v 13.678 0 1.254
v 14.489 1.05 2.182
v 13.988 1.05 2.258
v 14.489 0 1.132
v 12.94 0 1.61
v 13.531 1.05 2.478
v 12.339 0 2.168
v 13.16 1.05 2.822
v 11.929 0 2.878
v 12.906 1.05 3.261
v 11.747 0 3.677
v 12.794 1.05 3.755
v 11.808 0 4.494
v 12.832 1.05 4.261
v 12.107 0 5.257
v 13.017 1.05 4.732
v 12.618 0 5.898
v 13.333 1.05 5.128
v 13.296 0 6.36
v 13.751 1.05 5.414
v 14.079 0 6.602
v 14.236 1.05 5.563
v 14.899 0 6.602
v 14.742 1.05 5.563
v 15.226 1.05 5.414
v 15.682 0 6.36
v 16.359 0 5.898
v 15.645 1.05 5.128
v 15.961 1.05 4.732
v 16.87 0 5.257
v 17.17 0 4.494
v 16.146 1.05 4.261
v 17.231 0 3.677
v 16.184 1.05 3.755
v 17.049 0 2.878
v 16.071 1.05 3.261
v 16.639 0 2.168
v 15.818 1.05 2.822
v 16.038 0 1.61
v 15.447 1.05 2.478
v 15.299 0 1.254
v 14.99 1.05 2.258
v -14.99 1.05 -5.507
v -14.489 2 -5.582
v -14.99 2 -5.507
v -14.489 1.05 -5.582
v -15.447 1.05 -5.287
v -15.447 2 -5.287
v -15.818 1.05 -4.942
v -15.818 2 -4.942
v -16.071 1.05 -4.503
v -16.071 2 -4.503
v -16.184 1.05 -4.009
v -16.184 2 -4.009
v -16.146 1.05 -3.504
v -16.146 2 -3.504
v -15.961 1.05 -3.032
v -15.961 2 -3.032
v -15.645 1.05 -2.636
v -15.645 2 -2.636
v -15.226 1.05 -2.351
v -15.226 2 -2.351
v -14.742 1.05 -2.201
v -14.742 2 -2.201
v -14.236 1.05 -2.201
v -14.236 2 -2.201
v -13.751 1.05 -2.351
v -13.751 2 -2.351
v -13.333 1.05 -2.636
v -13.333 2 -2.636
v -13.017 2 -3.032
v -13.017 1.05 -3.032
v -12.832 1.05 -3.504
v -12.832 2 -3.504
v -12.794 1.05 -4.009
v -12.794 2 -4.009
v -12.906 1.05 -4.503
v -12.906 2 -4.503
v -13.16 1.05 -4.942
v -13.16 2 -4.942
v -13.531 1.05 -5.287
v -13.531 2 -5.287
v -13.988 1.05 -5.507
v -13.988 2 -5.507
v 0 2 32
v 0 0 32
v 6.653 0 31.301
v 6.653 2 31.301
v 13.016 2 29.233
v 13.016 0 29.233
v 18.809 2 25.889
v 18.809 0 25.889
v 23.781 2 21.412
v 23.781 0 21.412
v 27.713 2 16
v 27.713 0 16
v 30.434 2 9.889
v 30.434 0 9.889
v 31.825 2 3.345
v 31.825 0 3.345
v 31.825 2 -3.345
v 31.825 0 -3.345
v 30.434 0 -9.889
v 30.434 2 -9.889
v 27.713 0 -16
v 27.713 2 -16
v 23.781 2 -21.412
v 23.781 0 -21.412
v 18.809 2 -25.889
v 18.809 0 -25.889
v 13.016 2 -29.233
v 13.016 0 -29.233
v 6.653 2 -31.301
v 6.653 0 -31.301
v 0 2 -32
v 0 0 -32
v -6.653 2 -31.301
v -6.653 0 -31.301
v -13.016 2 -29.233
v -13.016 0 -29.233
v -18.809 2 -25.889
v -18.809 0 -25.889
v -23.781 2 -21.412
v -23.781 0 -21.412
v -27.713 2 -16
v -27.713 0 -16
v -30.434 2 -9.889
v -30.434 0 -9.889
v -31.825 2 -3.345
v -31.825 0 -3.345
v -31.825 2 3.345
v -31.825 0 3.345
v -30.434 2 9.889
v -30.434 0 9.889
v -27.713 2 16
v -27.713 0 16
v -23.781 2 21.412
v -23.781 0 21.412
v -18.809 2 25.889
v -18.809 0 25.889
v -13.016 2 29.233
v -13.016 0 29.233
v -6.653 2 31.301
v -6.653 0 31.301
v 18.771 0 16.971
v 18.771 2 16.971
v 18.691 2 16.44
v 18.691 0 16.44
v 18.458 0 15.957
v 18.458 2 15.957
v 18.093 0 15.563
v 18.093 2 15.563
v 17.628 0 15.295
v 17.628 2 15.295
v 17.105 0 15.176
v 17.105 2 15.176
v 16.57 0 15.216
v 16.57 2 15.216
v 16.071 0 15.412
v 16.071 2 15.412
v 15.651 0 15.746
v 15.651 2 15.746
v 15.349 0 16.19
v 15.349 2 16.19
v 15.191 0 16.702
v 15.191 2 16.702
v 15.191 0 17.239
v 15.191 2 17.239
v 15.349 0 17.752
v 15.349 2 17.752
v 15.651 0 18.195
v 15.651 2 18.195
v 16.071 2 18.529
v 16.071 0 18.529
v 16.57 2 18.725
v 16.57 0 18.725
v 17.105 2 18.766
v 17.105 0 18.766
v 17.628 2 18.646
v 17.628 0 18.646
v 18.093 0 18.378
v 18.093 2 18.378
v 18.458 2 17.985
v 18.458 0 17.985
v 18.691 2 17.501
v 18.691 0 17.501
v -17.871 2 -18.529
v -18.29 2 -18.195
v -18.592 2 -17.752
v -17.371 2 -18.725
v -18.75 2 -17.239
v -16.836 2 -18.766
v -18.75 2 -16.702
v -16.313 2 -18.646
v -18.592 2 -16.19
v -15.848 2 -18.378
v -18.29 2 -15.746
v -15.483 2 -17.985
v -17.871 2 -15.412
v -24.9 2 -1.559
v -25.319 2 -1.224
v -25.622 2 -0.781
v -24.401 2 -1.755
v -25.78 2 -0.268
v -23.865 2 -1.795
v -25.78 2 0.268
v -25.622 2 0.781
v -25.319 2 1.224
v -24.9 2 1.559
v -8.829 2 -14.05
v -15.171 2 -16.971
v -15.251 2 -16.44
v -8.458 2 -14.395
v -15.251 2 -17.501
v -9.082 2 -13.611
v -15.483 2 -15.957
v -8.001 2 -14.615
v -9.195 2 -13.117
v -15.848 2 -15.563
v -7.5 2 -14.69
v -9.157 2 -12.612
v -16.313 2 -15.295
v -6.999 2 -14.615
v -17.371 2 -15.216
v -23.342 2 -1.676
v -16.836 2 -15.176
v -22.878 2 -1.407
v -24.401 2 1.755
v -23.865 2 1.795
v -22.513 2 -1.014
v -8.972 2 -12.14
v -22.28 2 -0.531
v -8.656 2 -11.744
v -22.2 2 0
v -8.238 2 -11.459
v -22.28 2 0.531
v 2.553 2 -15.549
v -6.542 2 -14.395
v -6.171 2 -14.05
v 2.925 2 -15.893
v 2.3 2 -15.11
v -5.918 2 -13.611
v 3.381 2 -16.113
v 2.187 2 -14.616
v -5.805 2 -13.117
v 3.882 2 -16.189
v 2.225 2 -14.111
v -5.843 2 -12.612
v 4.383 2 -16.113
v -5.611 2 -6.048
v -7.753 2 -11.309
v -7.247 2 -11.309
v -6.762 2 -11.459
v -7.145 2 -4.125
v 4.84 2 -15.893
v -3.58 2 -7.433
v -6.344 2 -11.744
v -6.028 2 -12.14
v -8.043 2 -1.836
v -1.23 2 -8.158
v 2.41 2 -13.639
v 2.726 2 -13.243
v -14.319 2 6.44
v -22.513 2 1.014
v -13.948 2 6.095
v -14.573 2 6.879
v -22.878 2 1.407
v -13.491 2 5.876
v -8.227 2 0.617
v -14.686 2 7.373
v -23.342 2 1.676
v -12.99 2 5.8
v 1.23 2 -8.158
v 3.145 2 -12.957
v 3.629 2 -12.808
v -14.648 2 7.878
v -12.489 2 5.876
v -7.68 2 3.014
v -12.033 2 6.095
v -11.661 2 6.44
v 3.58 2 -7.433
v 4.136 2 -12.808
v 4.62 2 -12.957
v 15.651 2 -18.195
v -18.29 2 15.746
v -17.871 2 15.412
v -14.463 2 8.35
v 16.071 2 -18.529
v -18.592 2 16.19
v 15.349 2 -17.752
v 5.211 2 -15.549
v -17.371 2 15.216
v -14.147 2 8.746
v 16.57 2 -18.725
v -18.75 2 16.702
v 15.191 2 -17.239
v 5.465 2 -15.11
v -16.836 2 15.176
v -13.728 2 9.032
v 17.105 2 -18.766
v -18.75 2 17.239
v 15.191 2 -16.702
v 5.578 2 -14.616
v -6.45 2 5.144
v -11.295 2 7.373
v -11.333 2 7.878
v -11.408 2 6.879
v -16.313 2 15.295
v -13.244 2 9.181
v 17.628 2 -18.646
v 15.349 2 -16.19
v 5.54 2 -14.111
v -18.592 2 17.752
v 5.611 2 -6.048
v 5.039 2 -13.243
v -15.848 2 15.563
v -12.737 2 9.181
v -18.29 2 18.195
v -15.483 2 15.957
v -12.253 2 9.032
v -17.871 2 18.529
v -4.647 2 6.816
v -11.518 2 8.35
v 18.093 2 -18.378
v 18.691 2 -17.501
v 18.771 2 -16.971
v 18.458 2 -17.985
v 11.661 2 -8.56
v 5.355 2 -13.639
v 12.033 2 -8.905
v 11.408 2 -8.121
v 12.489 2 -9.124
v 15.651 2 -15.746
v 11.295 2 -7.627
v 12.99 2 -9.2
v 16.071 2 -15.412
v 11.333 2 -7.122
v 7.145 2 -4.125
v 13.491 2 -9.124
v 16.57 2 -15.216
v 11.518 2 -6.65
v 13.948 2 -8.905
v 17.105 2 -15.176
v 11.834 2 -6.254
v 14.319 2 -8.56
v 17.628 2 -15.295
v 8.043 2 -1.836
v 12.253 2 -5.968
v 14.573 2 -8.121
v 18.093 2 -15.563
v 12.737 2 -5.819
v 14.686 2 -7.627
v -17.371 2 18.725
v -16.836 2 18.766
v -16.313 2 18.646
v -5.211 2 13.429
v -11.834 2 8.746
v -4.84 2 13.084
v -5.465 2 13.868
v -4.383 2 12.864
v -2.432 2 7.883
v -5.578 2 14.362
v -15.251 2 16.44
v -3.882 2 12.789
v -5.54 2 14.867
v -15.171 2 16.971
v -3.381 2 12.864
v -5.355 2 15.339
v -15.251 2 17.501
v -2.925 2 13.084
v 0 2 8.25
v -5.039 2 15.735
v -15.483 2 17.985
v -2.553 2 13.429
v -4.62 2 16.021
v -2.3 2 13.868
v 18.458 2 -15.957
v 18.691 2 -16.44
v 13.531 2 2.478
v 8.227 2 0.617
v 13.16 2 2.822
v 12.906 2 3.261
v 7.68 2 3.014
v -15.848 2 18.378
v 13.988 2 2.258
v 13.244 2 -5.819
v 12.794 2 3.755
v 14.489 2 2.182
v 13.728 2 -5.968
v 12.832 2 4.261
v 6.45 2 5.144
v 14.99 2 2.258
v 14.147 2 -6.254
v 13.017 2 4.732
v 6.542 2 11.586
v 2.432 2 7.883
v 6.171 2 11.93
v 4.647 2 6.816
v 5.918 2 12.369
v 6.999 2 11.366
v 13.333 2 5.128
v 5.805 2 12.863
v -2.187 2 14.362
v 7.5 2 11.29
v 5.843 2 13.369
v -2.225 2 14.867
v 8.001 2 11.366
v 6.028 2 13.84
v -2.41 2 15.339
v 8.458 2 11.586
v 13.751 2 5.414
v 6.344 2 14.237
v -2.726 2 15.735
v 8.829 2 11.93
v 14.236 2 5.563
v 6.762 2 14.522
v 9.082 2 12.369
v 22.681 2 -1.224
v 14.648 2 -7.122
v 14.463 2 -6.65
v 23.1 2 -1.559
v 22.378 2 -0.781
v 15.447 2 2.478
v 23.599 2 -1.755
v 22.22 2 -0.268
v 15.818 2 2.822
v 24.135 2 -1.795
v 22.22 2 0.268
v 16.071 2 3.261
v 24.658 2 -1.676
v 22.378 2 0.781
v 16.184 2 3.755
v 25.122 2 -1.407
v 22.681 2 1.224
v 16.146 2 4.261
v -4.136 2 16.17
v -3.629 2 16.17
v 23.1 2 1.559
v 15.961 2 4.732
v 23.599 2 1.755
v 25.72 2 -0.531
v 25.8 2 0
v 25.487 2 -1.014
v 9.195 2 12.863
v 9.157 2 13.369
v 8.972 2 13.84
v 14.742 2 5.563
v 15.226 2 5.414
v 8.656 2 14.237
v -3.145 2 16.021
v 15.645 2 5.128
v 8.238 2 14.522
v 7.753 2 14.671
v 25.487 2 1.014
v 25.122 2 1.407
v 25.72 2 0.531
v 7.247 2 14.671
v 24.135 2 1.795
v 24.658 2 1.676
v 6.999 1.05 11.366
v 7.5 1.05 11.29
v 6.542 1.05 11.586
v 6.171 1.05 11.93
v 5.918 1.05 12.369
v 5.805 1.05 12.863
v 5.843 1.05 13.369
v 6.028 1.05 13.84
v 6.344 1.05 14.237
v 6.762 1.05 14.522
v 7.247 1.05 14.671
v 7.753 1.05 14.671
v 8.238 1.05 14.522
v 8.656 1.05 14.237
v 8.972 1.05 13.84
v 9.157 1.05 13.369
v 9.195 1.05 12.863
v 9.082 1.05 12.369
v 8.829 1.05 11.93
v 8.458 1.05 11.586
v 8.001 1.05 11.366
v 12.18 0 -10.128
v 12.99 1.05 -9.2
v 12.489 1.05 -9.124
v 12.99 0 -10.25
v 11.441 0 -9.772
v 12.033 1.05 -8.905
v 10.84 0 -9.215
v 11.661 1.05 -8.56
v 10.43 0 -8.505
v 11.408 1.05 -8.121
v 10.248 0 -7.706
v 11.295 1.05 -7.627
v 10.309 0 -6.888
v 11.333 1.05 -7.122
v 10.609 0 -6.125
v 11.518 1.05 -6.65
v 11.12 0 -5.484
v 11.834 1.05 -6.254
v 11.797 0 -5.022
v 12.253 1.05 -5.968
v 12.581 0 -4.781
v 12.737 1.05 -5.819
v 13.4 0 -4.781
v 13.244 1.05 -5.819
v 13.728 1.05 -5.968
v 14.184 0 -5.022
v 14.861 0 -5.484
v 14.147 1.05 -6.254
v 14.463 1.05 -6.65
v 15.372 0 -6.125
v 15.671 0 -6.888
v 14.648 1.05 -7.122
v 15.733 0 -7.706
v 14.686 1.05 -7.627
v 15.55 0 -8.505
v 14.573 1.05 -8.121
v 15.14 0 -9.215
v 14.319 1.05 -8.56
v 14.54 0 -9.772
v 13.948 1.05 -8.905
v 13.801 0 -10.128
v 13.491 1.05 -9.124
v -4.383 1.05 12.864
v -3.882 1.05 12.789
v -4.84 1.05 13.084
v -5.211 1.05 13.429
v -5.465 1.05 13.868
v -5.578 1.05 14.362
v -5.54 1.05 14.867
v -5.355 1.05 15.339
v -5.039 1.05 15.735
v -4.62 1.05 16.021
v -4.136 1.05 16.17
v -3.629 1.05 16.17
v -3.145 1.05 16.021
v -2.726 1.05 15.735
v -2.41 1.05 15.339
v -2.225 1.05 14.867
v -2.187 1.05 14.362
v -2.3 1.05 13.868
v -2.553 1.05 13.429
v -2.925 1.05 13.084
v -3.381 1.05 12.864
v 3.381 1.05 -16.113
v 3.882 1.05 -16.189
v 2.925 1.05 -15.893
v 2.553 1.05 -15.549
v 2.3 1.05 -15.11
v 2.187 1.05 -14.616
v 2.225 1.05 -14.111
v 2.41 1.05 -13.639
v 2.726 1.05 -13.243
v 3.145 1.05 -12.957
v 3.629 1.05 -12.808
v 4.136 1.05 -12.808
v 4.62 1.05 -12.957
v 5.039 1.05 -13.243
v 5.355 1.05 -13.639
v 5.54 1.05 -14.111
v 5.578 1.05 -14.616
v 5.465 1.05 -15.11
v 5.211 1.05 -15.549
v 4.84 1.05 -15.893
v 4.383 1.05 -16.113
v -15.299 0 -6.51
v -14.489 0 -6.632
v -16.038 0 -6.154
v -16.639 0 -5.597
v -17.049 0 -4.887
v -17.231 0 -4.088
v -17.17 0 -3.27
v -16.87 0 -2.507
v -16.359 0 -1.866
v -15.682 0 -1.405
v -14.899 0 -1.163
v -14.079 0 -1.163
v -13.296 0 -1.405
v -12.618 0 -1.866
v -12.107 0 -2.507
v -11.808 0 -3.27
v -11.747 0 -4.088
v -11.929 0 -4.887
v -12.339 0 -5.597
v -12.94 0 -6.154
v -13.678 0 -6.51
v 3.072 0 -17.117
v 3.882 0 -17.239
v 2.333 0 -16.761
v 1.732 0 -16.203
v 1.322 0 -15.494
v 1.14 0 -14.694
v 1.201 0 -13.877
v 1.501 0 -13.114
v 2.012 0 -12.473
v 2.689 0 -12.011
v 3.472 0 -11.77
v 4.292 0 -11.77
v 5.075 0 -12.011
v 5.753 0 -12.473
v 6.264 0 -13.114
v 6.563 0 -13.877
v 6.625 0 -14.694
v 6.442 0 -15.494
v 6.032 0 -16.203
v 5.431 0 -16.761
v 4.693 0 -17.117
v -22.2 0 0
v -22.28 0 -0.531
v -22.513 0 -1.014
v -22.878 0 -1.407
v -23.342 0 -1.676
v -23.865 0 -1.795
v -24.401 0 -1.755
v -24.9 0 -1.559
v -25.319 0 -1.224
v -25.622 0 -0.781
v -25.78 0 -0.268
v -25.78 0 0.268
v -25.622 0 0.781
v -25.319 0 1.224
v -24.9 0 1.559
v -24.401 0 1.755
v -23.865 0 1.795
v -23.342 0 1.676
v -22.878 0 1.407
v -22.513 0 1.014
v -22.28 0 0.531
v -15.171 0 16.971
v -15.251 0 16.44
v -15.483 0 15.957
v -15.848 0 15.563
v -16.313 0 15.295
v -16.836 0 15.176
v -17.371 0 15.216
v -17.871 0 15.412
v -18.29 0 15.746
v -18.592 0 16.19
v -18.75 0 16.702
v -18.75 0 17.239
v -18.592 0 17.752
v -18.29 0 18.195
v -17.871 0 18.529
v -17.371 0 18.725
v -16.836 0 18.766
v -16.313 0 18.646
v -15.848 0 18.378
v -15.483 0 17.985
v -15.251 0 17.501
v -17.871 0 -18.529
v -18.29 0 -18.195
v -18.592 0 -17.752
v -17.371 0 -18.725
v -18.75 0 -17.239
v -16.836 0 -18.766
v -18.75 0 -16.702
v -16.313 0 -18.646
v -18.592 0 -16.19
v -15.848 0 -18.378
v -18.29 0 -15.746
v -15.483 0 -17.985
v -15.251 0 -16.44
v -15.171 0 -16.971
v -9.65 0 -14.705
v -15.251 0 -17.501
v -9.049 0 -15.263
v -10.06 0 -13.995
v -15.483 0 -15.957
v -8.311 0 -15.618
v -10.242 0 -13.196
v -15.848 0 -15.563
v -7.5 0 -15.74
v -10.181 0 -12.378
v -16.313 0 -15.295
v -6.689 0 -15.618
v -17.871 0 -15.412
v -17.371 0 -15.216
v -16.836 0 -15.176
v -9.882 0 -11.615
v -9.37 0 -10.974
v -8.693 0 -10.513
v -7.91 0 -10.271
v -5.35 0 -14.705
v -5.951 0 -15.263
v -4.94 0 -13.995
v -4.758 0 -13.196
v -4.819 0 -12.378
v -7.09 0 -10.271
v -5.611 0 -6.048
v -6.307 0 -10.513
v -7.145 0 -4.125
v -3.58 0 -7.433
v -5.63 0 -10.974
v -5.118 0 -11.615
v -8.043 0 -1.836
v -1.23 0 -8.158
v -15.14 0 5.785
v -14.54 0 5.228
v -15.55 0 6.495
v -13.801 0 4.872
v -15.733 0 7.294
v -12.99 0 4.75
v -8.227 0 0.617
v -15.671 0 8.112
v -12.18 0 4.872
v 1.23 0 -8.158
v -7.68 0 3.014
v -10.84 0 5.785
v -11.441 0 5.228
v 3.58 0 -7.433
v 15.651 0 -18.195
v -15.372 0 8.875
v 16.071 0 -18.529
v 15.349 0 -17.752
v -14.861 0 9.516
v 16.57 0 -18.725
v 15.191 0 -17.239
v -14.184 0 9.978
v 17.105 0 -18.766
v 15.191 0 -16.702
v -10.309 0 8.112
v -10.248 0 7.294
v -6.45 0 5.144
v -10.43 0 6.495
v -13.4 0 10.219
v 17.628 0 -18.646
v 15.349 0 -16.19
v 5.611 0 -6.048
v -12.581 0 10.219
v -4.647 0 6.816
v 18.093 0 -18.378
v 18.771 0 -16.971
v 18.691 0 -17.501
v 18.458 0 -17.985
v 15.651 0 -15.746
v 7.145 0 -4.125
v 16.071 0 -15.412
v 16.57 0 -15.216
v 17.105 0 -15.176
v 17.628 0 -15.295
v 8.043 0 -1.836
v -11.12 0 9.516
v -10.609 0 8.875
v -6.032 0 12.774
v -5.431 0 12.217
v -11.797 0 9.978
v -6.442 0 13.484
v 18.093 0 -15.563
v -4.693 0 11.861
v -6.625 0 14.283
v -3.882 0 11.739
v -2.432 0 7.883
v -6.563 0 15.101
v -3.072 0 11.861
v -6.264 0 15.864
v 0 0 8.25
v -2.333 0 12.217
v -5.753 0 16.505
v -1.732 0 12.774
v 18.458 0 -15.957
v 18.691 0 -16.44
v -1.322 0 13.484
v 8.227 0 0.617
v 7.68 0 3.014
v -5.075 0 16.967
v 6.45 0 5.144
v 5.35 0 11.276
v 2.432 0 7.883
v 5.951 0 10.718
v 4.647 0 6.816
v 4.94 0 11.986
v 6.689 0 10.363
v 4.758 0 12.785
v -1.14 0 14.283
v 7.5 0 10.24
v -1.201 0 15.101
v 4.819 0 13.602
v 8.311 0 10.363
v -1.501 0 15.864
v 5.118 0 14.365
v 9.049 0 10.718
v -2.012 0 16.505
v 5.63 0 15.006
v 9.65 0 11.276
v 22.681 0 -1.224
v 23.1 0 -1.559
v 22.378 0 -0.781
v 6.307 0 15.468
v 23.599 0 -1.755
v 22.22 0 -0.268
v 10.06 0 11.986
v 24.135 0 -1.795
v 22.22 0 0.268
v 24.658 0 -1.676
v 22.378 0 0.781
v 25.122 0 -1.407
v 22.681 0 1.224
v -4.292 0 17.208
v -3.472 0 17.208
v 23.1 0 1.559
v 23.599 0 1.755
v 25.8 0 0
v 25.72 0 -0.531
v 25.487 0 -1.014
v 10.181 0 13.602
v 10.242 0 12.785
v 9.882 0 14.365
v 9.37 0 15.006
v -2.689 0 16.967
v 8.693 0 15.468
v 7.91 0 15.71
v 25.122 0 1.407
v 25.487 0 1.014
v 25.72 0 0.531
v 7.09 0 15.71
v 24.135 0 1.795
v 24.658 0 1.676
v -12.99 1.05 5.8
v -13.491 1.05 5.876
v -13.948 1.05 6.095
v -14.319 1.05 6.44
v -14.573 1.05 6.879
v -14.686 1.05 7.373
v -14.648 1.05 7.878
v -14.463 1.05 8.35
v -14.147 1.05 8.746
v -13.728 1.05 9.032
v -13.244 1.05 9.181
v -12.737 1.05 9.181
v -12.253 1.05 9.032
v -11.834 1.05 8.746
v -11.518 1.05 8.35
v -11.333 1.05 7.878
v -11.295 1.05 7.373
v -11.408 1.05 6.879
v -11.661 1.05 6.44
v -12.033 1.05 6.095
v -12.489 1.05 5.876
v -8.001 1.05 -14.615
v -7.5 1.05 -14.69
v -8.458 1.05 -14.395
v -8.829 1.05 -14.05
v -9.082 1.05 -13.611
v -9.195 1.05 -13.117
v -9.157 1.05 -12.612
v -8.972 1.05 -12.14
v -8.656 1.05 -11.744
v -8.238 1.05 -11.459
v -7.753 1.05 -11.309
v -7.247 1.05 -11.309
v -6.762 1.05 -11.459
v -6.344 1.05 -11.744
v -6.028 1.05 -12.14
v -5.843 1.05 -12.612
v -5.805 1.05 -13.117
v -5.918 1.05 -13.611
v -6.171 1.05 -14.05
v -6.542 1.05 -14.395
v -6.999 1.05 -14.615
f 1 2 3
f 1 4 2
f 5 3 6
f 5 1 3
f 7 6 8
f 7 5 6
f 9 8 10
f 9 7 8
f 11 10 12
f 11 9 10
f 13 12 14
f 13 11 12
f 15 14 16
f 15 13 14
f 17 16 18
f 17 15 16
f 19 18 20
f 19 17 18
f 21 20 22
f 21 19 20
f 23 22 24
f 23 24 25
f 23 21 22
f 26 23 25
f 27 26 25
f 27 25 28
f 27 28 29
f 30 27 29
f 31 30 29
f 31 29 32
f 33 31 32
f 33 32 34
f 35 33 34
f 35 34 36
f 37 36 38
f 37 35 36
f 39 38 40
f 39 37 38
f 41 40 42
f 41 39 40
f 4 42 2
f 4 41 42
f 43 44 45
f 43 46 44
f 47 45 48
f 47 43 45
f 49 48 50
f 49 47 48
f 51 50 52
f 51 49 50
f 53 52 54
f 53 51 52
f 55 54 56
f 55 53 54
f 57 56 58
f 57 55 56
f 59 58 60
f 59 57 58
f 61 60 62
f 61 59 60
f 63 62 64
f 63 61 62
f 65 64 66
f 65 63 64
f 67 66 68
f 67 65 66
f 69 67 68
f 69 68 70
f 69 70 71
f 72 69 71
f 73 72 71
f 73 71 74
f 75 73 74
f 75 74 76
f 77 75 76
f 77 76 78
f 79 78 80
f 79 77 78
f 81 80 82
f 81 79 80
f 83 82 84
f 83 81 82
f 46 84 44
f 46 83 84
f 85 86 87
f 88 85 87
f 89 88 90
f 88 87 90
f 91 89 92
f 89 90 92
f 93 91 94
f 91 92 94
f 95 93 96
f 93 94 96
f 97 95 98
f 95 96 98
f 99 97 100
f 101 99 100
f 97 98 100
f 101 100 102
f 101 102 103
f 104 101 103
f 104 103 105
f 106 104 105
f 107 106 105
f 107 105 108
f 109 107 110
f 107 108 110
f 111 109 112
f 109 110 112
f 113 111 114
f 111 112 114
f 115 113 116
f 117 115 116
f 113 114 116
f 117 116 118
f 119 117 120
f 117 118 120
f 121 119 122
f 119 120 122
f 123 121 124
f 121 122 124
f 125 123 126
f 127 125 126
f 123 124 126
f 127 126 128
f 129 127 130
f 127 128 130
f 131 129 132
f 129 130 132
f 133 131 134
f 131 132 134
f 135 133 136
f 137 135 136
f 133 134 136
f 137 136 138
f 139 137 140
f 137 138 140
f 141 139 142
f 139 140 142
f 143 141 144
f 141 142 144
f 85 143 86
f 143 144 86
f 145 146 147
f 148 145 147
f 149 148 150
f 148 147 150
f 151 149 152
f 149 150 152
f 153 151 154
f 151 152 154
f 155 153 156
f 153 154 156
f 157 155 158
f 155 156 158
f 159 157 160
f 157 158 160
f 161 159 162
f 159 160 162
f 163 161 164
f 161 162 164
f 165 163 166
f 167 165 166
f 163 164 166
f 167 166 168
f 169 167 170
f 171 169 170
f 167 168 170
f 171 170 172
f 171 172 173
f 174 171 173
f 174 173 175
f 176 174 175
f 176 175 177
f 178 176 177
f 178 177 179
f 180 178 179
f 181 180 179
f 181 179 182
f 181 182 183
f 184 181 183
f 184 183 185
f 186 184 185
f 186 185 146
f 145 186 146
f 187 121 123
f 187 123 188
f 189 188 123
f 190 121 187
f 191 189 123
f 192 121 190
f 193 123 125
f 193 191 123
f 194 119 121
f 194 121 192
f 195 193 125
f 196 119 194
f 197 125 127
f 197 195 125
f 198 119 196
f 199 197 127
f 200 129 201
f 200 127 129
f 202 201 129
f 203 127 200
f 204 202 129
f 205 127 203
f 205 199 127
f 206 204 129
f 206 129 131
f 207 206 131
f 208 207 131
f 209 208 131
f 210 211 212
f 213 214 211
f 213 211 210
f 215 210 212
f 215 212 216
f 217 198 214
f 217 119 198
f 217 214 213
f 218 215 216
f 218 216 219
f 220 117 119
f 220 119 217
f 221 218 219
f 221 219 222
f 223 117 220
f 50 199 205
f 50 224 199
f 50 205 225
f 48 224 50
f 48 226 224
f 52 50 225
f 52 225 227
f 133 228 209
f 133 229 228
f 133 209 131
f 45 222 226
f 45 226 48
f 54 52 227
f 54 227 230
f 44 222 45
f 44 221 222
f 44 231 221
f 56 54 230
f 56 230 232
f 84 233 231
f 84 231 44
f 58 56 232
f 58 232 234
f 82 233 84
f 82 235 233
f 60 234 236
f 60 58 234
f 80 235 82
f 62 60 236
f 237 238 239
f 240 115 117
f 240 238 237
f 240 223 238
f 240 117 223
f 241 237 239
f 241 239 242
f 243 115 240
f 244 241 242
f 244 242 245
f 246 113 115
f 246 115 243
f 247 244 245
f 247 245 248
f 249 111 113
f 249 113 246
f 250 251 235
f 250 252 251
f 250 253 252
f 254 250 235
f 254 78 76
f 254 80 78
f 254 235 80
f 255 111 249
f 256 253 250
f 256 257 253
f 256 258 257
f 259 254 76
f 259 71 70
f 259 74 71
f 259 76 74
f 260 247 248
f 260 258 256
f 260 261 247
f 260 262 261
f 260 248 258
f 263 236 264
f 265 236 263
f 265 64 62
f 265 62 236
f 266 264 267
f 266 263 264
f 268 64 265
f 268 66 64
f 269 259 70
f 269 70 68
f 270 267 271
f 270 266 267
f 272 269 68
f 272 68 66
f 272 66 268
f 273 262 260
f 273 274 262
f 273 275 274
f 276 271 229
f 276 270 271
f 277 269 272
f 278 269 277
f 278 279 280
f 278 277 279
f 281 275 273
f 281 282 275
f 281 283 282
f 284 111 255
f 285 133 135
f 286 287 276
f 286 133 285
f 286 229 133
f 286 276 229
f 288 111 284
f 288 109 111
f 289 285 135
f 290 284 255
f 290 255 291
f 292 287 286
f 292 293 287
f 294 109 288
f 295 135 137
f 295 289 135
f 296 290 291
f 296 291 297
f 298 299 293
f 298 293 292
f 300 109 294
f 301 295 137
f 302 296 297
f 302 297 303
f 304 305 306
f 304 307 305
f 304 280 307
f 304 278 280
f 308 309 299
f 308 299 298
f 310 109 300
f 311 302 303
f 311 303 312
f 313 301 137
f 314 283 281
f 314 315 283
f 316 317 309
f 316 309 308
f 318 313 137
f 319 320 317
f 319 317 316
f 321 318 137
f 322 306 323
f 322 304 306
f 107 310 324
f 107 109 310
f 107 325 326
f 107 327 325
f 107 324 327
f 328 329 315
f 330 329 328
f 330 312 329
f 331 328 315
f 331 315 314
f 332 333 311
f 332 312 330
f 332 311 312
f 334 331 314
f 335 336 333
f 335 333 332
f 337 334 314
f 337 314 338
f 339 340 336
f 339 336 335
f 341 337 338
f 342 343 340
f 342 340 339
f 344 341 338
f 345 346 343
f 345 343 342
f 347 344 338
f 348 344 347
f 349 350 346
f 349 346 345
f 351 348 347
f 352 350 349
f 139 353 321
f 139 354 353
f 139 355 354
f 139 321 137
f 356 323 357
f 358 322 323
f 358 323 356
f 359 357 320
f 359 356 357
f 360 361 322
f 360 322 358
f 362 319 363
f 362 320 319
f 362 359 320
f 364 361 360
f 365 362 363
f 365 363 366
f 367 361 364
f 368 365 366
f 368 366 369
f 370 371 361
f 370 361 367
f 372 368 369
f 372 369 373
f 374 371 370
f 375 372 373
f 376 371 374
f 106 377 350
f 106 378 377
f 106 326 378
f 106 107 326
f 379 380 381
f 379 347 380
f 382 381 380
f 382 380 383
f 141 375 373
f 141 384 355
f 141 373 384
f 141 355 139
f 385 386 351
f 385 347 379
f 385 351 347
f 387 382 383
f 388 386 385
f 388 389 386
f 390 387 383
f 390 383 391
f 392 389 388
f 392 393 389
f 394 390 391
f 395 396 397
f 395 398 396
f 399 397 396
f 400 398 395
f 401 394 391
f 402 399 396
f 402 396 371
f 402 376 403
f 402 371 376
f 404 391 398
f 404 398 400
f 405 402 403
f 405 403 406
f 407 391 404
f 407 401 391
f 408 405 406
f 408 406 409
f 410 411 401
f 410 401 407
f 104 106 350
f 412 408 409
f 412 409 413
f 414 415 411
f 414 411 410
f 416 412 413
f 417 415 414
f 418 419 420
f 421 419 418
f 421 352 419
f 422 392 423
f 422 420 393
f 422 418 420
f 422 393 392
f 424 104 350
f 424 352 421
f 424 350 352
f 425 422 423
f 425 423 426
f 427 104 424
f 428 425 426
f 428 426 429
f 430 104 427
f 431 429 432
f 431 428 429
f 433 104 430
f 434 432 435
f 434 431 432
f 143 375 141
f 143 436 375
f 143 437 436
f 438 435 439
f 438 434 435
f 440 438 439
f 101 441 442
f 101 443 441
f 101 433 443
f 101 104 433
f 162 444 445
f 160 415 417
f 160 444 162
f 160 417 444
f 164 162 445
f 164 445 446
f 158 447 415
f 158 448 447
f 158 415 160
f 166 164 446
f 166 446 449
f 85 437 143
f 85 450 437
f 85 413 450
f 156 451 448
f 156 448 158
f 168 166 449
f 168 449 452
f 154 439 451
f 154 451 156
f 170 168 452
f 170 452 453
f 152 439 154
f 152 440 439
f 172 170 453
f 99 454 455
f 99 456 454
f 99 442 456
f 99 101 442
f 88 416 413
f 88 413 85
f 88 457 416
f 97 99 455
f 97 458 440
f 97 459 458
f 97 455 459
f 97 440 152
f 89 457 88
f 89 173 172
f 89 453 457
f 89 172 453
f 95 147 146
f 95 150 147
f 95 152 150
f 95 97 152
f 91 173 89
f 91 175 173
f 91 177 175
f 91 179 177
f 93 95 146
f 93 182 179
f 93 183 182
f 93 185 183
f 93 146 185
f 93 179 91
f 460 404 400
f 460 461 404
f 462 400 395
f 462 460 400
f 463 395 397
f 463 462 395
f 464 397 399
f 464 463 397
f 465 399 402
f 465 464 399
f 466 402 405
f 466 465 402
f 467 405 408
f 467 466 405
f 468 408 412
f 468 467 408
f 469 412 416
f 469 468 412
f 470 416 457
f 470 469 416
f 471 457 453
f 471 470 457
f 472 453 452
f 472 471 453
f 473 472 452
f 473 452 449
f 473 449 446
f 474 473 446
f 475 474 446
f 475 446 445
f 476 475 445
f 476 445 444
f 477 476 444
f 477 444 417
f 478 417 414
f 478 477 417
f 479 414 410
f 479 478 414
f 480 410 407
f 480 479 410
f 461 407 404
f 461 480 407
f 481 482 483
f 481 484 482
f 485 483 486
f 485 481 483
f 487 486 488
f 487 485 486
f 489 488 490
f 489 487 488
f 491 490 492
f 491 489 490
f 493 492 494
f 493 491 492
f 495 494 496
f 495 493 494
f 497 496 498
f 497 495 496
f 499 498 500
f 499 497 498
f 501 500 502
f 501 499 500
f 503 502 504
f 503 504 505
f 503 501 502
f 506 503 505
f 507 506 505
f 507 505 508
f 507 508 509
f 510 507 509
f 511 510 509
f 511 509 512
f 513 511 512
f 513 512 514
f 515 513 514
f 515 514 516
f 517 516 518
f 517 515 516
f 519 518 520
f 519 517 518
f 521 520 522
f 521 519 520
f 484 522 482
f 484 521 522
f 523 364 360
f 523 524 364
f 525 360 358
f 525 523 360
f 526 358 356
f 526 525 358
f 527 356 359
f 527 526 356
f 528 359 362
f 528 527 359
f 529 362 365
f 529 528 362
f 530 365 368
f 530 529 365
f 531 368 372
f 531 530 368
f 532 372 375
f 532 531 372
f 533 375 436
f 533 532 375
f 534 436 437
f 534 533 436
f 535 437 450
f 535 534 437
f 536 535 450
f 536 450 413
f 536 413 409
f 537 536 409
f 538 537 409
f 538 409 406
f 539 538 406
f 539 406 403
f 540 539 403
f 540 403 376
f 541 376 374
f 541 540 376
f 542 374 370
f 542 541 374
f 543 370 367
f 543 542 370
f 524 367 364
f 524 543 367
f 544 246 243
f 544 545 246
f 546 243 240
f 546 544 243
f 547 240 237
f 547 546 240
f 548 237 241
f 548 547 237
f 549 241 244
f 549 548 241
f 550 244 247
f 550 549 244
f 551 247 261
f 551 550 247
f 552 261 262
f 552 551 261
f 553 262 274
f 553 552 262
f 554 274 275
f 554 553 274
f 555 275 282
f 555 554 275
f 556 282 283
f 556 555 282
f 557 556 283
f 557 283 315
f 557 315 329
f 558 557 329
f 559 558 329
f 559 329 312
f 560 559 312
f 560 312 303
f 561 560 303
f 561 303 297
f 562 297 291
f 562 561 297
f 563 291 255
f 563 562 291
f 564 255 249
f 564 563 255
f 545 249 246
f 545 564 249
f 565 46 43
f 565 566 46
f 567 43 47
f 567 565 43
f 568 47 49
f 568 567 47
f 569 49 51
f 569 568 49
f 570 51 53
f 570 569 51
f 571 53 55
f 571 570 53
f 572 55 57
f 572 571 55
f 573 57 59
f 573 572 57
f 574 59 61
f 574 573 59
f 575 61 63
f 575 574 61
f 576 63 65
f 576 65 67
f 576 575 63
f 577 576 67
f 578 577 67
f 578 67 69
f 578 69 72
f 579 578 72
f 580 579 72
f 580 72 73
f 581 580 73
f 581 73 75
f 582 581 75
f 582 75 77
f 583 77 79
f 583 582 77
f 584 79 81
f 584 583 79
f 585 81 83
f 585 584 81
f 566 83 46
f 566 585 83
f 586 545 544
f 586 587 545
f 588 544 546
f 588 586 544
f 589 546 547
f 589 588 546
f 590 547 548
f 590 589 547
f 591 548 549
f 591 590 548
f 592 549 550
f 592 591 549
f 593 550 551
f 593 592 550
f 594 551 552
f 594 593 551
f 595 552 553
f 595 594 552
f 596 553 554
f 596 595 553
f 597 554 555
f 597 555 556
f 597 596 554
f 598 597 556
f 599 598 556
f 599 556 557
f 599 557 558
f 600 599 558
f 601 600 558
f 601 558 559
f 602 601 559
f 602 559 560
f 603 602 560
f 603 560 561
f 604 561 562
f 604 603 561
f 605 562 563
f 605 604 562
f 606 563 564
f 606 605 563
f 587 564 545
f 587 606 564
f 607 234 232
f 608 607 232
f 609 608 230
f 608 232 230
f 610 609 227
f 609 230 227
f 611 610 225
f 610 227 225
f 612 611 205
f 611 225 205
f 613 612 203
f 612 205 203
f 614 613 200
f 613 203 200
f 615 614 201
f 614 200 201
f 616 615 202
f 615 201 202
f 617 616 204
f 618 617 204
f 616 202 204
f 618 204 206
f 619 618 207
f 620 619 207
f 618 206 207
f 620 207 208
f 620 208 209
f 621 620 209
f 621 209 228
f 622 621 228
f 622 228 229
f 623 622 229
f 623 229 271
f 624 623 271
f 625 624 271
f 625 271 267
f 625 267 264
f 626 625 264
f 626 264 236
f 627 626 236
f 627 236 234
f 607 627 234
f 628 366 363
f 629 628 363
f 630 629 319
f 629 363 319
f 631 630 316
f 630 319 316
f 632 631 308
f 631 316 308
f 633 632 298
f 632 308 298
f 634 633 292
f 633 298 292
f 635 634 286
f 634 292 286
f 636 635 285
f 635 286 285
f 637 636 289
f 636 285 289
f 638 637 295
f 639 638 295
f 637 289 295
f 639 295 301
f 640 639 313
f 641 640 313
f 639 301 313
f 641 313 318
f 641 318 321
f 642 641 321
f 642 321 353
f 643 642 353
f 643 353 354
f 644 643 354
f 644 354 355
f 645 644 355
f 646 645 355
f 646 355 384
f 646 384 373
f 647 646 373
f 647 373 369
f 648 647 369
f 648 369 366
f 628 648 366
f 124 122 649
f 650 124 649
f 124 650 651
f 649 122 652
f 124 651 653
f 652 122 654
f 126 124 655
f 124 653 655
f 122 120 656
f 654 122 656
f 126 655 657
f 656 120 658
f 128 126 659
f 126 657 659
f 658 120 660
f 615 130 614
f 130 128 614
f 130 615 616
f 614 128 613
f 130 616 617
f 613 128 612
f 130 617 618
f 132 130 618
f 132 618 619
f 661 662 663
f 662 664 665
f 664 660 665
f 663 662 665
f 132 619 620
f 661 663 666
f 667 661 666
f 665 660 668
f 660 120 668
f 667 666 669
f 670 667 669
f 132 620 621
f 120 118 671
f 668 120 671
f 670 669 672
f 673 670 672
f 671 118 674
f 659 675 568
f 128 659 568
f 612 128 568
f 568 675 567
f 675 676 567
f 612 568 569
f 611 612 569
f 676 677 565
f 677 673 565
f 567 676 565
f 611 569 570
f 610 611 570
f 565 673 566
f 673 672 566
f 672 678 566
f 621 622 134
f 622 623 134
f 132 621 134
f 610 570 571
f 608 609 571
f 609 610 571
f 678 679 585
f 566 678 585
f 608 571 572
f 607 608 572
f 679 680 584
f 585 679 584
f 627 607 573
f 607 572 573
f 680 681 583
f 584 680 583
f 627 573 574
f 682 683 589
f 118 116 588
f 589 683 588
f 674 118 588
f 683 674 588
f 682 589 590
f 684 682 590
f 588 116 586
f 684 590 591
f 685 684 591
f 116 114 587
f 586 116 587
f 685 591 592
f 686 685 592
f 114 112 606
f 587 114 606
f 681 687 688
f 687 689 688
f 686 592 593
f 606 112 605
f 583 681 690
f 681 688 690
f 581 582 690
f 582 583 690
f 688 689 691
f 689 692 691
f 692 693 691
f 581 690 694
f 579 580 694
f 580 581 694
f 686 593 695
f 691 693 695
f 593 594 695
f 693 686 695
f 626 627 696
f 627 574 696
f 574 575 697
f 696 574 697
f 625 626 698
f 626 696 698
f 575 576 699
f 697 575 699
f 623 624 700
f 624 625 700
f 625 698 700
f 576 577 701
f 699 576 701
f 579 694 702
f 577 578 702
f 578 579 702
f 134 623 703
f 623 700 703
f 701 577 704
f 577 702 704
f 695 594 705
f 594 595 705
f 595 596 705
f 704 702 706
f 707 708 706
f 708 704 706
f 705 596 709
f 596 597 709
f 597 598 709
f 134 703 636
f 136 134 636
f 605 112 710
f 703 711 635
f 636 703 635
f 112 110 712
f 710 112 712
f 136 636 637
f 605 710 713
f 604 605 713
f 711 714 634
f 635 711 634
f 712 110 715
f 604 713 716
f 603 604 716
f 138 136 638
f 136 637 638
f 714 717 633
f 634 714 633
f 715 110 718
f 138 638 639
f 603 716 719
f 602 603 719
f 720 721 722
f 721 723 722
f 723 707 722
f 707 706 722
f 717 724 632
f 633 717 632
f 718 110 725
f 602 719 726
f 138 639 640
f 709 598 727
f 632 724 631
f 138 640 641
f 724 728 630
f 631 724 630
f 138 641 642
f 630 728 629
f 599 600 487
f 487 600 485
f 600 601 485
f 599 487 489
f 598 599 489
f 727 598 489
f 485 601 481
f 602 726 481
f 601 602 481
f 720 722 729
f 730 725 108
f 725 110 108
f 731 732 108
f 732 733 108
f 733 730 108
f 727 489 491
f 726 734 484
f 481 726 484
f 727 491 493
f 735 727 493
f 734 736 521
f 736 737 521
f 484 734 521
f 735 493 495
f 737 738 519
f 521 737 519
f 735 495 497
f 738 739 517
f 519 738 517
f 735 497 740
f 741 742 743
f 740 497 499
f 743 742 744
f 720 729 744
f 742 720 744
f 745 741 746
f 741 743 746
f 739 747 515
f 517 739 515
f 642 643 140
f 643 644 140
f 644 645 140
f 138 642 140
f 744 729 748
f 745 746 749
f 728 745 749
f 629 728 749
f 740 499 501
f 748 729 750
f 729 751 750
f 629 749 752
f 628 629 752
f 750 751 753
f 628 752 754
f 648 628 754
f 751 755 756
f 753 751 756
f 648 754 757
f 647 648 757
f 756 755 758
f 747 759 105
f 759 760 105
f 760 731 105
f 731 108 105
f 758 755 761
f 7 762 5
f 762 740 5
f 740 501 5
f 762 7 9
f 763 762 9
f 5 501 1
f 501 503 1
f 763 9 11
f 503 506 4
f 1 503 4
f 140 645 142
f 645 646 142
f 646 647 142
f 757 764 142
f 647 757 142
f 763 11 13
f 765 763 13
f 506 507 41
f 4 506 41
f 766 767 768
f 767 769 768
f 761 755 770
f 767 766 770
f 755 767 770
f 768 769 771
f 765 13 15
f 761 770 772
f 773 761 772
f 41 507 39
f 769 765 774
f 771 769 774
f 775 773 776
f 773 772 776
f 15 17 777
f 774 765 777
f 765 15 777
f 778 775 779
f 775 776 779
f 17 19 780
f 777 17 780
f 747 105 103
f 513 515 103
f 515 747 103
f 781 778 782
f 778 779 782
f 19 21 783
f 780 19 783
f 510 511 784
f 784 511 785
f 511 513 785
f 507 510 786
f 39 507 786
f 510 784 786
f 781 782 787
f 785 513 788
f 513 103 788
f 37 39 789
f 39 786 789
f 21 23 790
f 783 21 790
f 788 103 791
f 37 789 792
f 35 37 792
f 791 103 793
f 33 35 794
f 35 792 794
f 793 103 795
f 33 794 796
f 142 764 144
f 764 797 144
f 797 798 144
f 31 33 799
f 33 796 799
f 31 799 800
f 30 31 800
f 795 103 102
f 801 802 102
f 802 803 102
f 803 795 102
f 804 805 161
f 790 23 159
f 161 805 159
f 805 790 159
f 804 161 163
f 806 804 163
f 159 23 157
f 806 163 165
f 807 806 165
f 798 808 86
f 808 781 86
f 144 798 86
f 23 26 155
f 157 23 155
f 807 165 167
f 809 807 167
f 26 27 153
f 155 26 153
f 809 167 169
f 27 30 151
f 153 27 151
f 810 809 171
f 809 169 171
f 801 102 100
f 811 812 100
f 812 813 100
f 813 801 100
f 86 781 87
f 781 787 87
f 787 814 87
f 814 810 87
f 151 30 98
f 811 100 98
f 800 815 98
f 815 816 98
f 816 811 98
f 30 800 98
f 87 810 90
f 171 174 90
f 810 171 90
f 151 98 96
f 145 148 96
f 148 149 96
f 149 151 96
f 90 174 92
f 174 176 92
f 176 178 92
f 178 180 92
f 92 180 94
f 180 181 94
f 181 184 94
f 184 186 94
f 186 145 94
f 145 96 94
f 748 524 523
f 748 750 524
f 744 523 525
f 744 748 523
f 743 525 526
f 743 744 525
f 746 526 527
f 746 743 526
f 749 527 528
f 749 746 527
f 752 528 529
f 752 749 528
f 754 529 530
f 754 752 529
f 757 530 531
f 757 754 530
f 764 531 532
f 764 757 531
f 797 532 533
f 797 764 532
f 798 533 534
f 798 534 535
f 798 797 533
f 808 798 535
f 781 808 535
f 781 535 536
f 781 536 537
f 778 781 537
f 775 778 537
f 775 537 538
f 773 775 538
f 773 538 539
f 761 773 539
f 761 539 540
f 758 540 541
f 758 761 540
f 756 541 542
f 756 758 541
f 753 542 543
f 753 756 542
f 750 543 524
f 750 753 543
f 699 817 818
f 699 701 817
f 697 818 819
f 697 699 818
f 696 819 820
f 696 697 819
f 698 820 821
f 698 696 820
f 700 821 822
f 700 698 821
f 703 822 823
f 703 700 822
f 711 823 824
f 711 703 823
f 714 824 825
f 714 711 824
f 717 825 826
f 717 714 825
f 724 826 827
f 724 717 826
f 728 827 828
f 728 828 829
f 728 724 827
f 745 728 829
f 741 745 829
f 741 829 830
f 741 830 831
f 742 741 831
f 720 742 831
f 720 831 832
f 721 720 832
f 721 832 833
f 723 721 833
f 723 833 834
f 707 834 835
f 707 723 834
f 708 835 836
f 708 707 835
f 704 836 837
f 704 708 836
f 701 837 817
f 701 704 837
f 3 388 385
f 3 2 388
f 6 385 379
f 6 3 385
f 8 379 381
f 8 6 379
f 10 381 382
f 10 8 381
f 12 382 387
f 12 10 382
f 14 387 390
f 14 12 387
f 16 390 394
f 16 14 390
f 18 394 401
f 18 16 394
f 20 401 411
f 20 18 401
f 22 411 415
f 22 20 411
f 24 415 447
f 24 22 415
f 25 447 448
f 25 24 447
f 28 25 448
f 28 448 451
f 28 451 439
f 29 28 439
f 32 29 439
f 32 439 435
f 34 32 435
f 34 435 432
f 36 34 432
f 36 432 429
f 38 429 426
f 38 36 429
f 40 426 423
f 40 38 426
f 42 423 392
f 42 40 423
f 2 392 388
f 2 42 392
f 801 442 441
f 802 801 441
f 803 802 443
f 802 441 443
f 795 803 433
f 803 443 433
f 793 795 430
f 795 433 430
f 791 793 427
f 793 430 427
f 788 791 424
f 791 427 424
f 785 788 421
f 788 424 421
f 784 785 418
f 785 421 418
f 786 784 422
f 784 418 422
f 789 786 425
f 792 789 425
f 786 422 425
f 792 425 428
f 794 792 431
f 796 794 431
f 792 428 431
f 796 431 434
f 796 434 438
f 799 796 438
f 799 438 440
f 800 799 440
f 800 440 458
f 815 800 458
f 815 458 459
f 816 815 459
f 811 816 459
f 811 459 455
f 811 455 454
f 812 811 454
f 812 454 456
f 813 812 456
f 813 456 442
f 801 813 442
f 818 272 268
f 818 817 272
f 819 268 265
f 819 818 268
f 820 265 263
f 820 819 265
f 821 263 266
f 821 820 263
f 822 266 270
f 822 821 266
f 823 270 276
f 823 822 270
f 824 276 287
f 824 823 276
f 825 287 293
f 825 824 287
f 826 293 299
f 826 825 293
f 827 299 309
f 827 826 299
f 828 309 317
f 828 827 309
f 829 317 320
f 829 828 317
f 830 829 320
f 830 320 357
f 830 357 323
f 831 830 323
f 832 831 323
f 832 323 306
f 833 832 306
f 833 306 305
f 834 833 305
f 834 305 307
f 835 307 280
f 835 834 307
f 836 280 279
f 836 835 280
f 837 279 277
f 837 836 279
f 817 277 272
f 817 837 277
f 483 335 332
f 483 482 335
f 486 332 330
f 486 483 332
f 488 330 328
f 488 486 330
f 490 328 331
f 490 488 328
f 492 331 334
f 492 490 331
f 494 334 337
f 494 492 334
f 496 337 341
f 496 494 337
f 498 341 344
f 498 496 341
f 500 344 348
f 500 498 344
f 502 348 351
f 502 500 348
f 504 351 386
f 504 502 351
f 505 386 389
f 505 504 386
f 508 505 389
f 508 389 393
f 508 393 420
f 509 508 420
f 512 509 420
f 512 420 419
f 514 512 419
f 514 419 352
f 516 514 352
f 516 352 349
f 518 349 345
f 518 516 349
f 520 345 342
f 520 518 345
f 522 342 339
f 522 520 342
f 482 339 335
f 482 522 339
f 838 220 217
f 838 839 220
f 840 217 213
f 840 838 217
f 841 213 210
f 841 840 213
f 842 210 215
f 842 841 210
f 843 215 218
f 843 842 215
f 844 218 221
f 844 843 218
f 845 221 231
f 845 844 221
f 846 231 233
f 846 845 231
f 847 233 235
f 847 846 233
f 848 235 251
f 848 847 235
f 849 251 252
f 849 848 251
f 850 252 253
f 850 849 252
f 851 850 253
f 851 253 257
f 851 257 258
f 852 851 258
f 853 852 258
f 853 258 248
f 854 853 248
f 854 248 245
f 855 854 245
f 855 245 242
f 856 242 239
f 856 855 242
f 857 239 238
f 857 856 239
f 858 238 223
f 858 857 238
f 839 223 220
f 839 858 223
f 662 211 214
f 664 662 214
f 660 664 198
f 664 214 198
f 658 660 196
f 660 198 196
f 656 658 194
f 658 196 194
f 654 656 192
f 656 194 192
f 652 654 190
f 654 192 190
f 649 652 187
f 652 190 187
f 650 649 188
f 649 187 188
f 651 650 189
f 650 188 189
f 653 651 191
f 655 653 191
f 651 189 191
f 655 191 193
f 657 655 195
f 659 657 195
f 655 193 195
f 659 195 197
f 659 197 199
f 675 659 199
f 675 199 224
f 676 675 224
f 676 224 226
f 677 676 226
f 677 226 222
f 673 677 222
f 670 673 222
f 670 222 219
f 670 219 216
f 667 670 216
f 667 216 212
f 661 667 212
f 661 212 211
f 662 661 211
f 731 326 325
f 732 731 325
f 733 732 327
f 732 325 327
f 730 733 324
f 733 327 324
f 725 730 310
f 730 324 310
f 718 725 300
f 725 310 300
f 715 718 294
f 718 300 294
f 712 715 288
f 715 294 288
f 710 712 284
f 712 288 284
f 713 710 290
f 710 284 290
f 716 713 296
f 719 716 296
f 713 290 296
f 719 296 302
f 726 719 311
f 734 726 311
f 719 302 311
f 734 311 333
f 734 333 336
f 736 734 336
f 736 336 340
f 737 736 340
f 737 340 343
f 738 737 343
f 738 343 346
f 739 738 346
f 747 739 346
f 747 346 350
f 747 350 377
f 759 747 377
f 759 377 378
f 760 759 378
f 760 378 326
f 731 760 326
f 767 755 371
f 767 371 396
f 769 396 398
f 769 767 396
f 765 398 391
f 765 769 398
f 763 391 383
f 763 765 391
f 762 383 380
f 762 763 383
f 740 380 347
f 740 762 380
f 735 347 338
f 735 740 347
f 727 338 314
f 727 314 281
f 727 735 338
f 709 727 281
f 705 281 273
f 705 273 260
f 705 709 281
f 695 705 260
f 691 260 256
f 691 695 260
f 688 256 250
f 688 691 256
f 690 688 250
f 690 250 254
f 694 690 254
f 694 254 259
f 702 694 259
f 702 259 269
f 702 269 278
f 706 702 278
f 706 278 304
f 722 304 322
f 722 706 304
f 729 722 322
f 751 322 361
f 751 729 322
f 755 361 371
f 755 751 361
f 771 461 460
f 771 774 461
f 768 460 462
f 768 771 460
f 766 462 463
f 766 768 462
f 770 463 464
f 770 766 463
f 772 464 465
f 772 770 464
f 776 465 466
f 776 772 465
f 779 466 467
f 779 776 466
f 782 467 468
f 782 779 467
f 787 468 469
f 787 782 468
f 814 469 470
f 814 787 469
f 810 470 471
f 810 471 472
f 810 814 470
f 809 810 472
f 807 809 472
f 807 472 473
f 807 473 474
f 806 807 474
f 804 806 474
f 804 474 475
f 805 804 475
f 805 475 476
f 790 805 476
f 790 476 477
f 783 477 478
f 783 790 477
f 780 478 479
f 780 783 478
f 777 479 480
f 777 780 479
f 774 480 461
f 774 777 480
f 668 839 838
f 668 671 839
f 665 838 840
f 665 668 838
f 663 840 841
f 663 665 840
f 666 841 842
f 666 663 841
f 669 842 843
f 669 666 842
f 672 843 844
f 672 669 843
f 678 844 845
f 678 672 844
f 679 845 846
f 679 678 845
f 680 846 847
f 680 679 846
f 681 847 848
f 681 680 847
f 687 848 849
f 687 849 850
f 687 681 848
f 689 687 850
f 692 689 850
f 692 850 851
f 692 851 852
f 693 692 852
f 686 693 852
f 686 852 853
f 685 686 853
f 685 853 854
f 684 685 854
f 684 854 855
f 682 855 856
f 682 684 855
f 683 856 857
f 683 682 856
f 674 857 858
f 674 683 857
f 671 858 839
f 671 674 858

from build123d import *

# Parameters (mm, degrees)
SKETCH1_R                                    = 32
SKETCH1_R_2                                  = 8.25
BOSS_EXTRUDE1_DEPTH                          = 2
CSK_FOR_M3_HEX_SOCKET_COUNTERSUNK_HE_2_COUNT = 2
CSK_FOR_M3_HEX_SOCKET_COUNTERSUNK_HE_2_PITCH = 11.480502971
CSK_FOR_M3_HEX_SOCKET_COUNTERSUNK_HE_3_COUNT = 2
CSK_FOR_M3_HEX_SOCKET_COUNTERSUNK_HE_3_PITCH = 21.213203436
CSK_FOR_M3_HEX_SOCKET_COUNTERSUNK_HE_4_COUNT = 2
CSK_FOR_M3_HEX_SOCKET_COUNTERSUNK_HE_4_PITCH = 27.716385975
CSK_FOR_M3_HEX_SOCKET_COUNTERSUNK_HE_5_COUNT = 2
CSK_FOR_M3_HEX_SOCKET_COUNTERSUNK_HE_5_PITCH = 30
CSK_FOR_M3_HEX_SOCKET_COUNTERSUNK_HE_6_COUNT = 2
CSK_FOR_M3_HEX_SOCKET_COUNTERSUNK_HE_6_PITCH = 27.716385975
CSK_FOR_M3_HEX_SOCKET_COUNTERSUNK_HE_7_COUNT = 2
CSK_FOR_M3_HEX_SOCKET_COUNTERSUNK_HE_7_PITCH = 21.213203436
CSK_FOR_M3_HEX_SOCKET_COUNTERSUNK_HE_8_COUNT = 2
CSK_FOR_M3_HEX_SOCKET_COUNTERSUNK_HE_8_PITCH = 11.480502971
M3_CLEARANCE_HOLE1_D                         = 3.6


with BuildPart() as part:
    # Sketch1 → Boss-Extrude1 (new body)
    with BuildSketch(Plane(origin=(0, 0, 0), x_dir=(1, 0, 0), z_dir=(0, 1, 0))):
        with Locations(Location((0, 0, 0), (0, 0, 270))):
            Circle(SKETCH1_R)
        with Locations(Location((0, 0, 0), (0, 0, 270))):
            Circle(SKETCH1_R_2, mode=Mode.SUBTRACT)
    extrude(amount=BOSS_EXTRUDE1_DEPTH)

    # Sketch4 → CSK for M3 Hex Socket Countersunk Head Screw1 (revolve, cut)
    with BuildSketch(Plane(origin=(3.882285677, 0, -14.488887394), x_dir=(0, 0, -1), z_dir=(1, 0, 0))):
        Polygon((0, 0), (0, 2), (1.7, 2), (1.7, 1.05), (2.75, 0), align=None)
    csk_for_m3_hex_socket_countersunk_head_s = revolve(axis=Axis((3.882285677, -6.35, -14.488887394), (0, 1, 0)), mode=Mode.SUBTRACT)

    # CSK for M3 Hex Socket Countersunk He 2: CSK for M3 Hex Socket Countersunk Head Screw1 ×2
    with Locations(*[Vector(0.7933533402912735, 0, 0.6087614290086708) * (i * CSK_FOR_M3_HEX_SOCKET_COUNTERSUNK_HE_2_PITCH) for i in range(1, CSK_FOR_M3_HEX_SOCKET_COUNTERSUNK_HE_2_COUNT)]):
        add(csk_for_m3_hex_socket_countersunk_head_s, mode=Mode.SUBTRACT)

    # CSK for M3 Hex Socket Countersunk He 3: CSK for M3 Hex Socket Countersunk Head Screw1 ×2
    with Locations(*[Vector(0.5000000000000544, 0, 0.8660254037844073) * (i * CSK_FOR_M3_HEX_SOCKET_COUNTERSUNK_HE_3_PITCH) for i in range(1, CSK_FOR_M3_HEX_SOCKET_COUNTERSUNK_HE_3_COUNT)]):
        add(csk_for_m3_hex_socket_countersunk_head_s, mode=Mode.SUBTRACT)

    # CSK for M3 Hex Socket Countersunk He 4: CSK for M3 Hex Socket Countersunk Head Screw1 ×2
    with Locations(*[Vector(0.13052619222011386, 0, 0.9914448613738023) * (i * CSK_FOR_M3_HEX_SOCKET_COUNTERSUNK_HE_4_PITCH) for i in range(1, CSK_FOR_M3_HEX_SOCKET_COUNTERSUNK_HE_4_COUNT)]):
        add(csk_for_m3_hex_socket_countersunk_head_s, mode=Mode.SUBTRACT)

    # CSK for M3 Hex Socket Countersunk He 5: CSK for M3 Hex Socket Countersunk Head Screw1 ×2
    with Locations(*[Vector(-0.25881904510246007, 0, 0.9659258262890846) * (i * CSK_FOR_M3_HEX_SOCKET_COUNTERSUNK_HE_5_PITCH) for i in range(1, CSK_FOR_M3_HEX_SOCKET_COUNTERSUNK_HE_5_COUNT)]):
        add(csk_for_m3_hex_socket_countersunk_head_s, mode=Mode.SUBTRACT)

    # CSK for M3 Hex Socket Countersunk He 6: CSK for M3 Hex Socket Countersunk Head Screw1 ×2
    with Locations(*[Vector(-0.6087614290086708, 0, 0.7933533402912735) * (i * CSK_FOR_M3_HEX_SOCKET_COUNTERSUNK_HE_6_PITCH) for i in range(1, CSK_FOR_M3_HEX_SOCKET_COUNTERSUNK_HE_6_COUNT)]):
        add(csk_for_m3_hex_socket_countersunk_head_s, mode=Mode.SUBTRACT)

    # CSK for M3 Hex Socket Countersunk He 7: CSK for M3 Hex Socket Countersunk Head Screw1 ×2
    with Locations(*[Vector(-0.8660254037844073, 0, 0.5000000000000544) * (i * CSK_FOR_M3_HEX_SOCKET_COUNTERSUNK_HE_7_PITCH) for i in range(1, CSK_FOR_M3_HEX_SOCKET_COUNTERSUNK_HE_7_COUNT)]):
        add(csk_for_m3_hex_socket_countersunk_head_s, mode=Mode.SUBTRACT)

    # CSK for M3 Hex Socket Countersunk He 8: CSK for M3 Hex Socket Countersunk Head Screw1 ×2
    with Locations(*[Vector(-0.9914448613738023, 0, 0.13052619222011383) * (i * CSK_FOR_M3_HEX_SOCKET_COUNTERSUNK_HE_8_PITCH) for i in range(1, CSK_FOR_M3_HEX_SOCKET_COUNTERSUNK_HE_8_COUNT)]):
        add(csk_for_m3_hex_socket_countersunk_head_s, mode=Mode.SUBTRACT)

    # M3 Clearance Hole1 (through all)
    with Locations(Plane(origin=(0, 0, 0), x_dir=(-1, 0, 0), z_dir=(0, -1, 0))):
        with Locations((-16.970562748, -16.970562748), (-24, 0), (-16.970562748, 16.970562748), (16.970562748, 16.970562748), (24, 0), (16.970562748, -16.970562748)):
            Hole(M3_CLEARANCE_HOLE1_D / 2)


solid = part.part
